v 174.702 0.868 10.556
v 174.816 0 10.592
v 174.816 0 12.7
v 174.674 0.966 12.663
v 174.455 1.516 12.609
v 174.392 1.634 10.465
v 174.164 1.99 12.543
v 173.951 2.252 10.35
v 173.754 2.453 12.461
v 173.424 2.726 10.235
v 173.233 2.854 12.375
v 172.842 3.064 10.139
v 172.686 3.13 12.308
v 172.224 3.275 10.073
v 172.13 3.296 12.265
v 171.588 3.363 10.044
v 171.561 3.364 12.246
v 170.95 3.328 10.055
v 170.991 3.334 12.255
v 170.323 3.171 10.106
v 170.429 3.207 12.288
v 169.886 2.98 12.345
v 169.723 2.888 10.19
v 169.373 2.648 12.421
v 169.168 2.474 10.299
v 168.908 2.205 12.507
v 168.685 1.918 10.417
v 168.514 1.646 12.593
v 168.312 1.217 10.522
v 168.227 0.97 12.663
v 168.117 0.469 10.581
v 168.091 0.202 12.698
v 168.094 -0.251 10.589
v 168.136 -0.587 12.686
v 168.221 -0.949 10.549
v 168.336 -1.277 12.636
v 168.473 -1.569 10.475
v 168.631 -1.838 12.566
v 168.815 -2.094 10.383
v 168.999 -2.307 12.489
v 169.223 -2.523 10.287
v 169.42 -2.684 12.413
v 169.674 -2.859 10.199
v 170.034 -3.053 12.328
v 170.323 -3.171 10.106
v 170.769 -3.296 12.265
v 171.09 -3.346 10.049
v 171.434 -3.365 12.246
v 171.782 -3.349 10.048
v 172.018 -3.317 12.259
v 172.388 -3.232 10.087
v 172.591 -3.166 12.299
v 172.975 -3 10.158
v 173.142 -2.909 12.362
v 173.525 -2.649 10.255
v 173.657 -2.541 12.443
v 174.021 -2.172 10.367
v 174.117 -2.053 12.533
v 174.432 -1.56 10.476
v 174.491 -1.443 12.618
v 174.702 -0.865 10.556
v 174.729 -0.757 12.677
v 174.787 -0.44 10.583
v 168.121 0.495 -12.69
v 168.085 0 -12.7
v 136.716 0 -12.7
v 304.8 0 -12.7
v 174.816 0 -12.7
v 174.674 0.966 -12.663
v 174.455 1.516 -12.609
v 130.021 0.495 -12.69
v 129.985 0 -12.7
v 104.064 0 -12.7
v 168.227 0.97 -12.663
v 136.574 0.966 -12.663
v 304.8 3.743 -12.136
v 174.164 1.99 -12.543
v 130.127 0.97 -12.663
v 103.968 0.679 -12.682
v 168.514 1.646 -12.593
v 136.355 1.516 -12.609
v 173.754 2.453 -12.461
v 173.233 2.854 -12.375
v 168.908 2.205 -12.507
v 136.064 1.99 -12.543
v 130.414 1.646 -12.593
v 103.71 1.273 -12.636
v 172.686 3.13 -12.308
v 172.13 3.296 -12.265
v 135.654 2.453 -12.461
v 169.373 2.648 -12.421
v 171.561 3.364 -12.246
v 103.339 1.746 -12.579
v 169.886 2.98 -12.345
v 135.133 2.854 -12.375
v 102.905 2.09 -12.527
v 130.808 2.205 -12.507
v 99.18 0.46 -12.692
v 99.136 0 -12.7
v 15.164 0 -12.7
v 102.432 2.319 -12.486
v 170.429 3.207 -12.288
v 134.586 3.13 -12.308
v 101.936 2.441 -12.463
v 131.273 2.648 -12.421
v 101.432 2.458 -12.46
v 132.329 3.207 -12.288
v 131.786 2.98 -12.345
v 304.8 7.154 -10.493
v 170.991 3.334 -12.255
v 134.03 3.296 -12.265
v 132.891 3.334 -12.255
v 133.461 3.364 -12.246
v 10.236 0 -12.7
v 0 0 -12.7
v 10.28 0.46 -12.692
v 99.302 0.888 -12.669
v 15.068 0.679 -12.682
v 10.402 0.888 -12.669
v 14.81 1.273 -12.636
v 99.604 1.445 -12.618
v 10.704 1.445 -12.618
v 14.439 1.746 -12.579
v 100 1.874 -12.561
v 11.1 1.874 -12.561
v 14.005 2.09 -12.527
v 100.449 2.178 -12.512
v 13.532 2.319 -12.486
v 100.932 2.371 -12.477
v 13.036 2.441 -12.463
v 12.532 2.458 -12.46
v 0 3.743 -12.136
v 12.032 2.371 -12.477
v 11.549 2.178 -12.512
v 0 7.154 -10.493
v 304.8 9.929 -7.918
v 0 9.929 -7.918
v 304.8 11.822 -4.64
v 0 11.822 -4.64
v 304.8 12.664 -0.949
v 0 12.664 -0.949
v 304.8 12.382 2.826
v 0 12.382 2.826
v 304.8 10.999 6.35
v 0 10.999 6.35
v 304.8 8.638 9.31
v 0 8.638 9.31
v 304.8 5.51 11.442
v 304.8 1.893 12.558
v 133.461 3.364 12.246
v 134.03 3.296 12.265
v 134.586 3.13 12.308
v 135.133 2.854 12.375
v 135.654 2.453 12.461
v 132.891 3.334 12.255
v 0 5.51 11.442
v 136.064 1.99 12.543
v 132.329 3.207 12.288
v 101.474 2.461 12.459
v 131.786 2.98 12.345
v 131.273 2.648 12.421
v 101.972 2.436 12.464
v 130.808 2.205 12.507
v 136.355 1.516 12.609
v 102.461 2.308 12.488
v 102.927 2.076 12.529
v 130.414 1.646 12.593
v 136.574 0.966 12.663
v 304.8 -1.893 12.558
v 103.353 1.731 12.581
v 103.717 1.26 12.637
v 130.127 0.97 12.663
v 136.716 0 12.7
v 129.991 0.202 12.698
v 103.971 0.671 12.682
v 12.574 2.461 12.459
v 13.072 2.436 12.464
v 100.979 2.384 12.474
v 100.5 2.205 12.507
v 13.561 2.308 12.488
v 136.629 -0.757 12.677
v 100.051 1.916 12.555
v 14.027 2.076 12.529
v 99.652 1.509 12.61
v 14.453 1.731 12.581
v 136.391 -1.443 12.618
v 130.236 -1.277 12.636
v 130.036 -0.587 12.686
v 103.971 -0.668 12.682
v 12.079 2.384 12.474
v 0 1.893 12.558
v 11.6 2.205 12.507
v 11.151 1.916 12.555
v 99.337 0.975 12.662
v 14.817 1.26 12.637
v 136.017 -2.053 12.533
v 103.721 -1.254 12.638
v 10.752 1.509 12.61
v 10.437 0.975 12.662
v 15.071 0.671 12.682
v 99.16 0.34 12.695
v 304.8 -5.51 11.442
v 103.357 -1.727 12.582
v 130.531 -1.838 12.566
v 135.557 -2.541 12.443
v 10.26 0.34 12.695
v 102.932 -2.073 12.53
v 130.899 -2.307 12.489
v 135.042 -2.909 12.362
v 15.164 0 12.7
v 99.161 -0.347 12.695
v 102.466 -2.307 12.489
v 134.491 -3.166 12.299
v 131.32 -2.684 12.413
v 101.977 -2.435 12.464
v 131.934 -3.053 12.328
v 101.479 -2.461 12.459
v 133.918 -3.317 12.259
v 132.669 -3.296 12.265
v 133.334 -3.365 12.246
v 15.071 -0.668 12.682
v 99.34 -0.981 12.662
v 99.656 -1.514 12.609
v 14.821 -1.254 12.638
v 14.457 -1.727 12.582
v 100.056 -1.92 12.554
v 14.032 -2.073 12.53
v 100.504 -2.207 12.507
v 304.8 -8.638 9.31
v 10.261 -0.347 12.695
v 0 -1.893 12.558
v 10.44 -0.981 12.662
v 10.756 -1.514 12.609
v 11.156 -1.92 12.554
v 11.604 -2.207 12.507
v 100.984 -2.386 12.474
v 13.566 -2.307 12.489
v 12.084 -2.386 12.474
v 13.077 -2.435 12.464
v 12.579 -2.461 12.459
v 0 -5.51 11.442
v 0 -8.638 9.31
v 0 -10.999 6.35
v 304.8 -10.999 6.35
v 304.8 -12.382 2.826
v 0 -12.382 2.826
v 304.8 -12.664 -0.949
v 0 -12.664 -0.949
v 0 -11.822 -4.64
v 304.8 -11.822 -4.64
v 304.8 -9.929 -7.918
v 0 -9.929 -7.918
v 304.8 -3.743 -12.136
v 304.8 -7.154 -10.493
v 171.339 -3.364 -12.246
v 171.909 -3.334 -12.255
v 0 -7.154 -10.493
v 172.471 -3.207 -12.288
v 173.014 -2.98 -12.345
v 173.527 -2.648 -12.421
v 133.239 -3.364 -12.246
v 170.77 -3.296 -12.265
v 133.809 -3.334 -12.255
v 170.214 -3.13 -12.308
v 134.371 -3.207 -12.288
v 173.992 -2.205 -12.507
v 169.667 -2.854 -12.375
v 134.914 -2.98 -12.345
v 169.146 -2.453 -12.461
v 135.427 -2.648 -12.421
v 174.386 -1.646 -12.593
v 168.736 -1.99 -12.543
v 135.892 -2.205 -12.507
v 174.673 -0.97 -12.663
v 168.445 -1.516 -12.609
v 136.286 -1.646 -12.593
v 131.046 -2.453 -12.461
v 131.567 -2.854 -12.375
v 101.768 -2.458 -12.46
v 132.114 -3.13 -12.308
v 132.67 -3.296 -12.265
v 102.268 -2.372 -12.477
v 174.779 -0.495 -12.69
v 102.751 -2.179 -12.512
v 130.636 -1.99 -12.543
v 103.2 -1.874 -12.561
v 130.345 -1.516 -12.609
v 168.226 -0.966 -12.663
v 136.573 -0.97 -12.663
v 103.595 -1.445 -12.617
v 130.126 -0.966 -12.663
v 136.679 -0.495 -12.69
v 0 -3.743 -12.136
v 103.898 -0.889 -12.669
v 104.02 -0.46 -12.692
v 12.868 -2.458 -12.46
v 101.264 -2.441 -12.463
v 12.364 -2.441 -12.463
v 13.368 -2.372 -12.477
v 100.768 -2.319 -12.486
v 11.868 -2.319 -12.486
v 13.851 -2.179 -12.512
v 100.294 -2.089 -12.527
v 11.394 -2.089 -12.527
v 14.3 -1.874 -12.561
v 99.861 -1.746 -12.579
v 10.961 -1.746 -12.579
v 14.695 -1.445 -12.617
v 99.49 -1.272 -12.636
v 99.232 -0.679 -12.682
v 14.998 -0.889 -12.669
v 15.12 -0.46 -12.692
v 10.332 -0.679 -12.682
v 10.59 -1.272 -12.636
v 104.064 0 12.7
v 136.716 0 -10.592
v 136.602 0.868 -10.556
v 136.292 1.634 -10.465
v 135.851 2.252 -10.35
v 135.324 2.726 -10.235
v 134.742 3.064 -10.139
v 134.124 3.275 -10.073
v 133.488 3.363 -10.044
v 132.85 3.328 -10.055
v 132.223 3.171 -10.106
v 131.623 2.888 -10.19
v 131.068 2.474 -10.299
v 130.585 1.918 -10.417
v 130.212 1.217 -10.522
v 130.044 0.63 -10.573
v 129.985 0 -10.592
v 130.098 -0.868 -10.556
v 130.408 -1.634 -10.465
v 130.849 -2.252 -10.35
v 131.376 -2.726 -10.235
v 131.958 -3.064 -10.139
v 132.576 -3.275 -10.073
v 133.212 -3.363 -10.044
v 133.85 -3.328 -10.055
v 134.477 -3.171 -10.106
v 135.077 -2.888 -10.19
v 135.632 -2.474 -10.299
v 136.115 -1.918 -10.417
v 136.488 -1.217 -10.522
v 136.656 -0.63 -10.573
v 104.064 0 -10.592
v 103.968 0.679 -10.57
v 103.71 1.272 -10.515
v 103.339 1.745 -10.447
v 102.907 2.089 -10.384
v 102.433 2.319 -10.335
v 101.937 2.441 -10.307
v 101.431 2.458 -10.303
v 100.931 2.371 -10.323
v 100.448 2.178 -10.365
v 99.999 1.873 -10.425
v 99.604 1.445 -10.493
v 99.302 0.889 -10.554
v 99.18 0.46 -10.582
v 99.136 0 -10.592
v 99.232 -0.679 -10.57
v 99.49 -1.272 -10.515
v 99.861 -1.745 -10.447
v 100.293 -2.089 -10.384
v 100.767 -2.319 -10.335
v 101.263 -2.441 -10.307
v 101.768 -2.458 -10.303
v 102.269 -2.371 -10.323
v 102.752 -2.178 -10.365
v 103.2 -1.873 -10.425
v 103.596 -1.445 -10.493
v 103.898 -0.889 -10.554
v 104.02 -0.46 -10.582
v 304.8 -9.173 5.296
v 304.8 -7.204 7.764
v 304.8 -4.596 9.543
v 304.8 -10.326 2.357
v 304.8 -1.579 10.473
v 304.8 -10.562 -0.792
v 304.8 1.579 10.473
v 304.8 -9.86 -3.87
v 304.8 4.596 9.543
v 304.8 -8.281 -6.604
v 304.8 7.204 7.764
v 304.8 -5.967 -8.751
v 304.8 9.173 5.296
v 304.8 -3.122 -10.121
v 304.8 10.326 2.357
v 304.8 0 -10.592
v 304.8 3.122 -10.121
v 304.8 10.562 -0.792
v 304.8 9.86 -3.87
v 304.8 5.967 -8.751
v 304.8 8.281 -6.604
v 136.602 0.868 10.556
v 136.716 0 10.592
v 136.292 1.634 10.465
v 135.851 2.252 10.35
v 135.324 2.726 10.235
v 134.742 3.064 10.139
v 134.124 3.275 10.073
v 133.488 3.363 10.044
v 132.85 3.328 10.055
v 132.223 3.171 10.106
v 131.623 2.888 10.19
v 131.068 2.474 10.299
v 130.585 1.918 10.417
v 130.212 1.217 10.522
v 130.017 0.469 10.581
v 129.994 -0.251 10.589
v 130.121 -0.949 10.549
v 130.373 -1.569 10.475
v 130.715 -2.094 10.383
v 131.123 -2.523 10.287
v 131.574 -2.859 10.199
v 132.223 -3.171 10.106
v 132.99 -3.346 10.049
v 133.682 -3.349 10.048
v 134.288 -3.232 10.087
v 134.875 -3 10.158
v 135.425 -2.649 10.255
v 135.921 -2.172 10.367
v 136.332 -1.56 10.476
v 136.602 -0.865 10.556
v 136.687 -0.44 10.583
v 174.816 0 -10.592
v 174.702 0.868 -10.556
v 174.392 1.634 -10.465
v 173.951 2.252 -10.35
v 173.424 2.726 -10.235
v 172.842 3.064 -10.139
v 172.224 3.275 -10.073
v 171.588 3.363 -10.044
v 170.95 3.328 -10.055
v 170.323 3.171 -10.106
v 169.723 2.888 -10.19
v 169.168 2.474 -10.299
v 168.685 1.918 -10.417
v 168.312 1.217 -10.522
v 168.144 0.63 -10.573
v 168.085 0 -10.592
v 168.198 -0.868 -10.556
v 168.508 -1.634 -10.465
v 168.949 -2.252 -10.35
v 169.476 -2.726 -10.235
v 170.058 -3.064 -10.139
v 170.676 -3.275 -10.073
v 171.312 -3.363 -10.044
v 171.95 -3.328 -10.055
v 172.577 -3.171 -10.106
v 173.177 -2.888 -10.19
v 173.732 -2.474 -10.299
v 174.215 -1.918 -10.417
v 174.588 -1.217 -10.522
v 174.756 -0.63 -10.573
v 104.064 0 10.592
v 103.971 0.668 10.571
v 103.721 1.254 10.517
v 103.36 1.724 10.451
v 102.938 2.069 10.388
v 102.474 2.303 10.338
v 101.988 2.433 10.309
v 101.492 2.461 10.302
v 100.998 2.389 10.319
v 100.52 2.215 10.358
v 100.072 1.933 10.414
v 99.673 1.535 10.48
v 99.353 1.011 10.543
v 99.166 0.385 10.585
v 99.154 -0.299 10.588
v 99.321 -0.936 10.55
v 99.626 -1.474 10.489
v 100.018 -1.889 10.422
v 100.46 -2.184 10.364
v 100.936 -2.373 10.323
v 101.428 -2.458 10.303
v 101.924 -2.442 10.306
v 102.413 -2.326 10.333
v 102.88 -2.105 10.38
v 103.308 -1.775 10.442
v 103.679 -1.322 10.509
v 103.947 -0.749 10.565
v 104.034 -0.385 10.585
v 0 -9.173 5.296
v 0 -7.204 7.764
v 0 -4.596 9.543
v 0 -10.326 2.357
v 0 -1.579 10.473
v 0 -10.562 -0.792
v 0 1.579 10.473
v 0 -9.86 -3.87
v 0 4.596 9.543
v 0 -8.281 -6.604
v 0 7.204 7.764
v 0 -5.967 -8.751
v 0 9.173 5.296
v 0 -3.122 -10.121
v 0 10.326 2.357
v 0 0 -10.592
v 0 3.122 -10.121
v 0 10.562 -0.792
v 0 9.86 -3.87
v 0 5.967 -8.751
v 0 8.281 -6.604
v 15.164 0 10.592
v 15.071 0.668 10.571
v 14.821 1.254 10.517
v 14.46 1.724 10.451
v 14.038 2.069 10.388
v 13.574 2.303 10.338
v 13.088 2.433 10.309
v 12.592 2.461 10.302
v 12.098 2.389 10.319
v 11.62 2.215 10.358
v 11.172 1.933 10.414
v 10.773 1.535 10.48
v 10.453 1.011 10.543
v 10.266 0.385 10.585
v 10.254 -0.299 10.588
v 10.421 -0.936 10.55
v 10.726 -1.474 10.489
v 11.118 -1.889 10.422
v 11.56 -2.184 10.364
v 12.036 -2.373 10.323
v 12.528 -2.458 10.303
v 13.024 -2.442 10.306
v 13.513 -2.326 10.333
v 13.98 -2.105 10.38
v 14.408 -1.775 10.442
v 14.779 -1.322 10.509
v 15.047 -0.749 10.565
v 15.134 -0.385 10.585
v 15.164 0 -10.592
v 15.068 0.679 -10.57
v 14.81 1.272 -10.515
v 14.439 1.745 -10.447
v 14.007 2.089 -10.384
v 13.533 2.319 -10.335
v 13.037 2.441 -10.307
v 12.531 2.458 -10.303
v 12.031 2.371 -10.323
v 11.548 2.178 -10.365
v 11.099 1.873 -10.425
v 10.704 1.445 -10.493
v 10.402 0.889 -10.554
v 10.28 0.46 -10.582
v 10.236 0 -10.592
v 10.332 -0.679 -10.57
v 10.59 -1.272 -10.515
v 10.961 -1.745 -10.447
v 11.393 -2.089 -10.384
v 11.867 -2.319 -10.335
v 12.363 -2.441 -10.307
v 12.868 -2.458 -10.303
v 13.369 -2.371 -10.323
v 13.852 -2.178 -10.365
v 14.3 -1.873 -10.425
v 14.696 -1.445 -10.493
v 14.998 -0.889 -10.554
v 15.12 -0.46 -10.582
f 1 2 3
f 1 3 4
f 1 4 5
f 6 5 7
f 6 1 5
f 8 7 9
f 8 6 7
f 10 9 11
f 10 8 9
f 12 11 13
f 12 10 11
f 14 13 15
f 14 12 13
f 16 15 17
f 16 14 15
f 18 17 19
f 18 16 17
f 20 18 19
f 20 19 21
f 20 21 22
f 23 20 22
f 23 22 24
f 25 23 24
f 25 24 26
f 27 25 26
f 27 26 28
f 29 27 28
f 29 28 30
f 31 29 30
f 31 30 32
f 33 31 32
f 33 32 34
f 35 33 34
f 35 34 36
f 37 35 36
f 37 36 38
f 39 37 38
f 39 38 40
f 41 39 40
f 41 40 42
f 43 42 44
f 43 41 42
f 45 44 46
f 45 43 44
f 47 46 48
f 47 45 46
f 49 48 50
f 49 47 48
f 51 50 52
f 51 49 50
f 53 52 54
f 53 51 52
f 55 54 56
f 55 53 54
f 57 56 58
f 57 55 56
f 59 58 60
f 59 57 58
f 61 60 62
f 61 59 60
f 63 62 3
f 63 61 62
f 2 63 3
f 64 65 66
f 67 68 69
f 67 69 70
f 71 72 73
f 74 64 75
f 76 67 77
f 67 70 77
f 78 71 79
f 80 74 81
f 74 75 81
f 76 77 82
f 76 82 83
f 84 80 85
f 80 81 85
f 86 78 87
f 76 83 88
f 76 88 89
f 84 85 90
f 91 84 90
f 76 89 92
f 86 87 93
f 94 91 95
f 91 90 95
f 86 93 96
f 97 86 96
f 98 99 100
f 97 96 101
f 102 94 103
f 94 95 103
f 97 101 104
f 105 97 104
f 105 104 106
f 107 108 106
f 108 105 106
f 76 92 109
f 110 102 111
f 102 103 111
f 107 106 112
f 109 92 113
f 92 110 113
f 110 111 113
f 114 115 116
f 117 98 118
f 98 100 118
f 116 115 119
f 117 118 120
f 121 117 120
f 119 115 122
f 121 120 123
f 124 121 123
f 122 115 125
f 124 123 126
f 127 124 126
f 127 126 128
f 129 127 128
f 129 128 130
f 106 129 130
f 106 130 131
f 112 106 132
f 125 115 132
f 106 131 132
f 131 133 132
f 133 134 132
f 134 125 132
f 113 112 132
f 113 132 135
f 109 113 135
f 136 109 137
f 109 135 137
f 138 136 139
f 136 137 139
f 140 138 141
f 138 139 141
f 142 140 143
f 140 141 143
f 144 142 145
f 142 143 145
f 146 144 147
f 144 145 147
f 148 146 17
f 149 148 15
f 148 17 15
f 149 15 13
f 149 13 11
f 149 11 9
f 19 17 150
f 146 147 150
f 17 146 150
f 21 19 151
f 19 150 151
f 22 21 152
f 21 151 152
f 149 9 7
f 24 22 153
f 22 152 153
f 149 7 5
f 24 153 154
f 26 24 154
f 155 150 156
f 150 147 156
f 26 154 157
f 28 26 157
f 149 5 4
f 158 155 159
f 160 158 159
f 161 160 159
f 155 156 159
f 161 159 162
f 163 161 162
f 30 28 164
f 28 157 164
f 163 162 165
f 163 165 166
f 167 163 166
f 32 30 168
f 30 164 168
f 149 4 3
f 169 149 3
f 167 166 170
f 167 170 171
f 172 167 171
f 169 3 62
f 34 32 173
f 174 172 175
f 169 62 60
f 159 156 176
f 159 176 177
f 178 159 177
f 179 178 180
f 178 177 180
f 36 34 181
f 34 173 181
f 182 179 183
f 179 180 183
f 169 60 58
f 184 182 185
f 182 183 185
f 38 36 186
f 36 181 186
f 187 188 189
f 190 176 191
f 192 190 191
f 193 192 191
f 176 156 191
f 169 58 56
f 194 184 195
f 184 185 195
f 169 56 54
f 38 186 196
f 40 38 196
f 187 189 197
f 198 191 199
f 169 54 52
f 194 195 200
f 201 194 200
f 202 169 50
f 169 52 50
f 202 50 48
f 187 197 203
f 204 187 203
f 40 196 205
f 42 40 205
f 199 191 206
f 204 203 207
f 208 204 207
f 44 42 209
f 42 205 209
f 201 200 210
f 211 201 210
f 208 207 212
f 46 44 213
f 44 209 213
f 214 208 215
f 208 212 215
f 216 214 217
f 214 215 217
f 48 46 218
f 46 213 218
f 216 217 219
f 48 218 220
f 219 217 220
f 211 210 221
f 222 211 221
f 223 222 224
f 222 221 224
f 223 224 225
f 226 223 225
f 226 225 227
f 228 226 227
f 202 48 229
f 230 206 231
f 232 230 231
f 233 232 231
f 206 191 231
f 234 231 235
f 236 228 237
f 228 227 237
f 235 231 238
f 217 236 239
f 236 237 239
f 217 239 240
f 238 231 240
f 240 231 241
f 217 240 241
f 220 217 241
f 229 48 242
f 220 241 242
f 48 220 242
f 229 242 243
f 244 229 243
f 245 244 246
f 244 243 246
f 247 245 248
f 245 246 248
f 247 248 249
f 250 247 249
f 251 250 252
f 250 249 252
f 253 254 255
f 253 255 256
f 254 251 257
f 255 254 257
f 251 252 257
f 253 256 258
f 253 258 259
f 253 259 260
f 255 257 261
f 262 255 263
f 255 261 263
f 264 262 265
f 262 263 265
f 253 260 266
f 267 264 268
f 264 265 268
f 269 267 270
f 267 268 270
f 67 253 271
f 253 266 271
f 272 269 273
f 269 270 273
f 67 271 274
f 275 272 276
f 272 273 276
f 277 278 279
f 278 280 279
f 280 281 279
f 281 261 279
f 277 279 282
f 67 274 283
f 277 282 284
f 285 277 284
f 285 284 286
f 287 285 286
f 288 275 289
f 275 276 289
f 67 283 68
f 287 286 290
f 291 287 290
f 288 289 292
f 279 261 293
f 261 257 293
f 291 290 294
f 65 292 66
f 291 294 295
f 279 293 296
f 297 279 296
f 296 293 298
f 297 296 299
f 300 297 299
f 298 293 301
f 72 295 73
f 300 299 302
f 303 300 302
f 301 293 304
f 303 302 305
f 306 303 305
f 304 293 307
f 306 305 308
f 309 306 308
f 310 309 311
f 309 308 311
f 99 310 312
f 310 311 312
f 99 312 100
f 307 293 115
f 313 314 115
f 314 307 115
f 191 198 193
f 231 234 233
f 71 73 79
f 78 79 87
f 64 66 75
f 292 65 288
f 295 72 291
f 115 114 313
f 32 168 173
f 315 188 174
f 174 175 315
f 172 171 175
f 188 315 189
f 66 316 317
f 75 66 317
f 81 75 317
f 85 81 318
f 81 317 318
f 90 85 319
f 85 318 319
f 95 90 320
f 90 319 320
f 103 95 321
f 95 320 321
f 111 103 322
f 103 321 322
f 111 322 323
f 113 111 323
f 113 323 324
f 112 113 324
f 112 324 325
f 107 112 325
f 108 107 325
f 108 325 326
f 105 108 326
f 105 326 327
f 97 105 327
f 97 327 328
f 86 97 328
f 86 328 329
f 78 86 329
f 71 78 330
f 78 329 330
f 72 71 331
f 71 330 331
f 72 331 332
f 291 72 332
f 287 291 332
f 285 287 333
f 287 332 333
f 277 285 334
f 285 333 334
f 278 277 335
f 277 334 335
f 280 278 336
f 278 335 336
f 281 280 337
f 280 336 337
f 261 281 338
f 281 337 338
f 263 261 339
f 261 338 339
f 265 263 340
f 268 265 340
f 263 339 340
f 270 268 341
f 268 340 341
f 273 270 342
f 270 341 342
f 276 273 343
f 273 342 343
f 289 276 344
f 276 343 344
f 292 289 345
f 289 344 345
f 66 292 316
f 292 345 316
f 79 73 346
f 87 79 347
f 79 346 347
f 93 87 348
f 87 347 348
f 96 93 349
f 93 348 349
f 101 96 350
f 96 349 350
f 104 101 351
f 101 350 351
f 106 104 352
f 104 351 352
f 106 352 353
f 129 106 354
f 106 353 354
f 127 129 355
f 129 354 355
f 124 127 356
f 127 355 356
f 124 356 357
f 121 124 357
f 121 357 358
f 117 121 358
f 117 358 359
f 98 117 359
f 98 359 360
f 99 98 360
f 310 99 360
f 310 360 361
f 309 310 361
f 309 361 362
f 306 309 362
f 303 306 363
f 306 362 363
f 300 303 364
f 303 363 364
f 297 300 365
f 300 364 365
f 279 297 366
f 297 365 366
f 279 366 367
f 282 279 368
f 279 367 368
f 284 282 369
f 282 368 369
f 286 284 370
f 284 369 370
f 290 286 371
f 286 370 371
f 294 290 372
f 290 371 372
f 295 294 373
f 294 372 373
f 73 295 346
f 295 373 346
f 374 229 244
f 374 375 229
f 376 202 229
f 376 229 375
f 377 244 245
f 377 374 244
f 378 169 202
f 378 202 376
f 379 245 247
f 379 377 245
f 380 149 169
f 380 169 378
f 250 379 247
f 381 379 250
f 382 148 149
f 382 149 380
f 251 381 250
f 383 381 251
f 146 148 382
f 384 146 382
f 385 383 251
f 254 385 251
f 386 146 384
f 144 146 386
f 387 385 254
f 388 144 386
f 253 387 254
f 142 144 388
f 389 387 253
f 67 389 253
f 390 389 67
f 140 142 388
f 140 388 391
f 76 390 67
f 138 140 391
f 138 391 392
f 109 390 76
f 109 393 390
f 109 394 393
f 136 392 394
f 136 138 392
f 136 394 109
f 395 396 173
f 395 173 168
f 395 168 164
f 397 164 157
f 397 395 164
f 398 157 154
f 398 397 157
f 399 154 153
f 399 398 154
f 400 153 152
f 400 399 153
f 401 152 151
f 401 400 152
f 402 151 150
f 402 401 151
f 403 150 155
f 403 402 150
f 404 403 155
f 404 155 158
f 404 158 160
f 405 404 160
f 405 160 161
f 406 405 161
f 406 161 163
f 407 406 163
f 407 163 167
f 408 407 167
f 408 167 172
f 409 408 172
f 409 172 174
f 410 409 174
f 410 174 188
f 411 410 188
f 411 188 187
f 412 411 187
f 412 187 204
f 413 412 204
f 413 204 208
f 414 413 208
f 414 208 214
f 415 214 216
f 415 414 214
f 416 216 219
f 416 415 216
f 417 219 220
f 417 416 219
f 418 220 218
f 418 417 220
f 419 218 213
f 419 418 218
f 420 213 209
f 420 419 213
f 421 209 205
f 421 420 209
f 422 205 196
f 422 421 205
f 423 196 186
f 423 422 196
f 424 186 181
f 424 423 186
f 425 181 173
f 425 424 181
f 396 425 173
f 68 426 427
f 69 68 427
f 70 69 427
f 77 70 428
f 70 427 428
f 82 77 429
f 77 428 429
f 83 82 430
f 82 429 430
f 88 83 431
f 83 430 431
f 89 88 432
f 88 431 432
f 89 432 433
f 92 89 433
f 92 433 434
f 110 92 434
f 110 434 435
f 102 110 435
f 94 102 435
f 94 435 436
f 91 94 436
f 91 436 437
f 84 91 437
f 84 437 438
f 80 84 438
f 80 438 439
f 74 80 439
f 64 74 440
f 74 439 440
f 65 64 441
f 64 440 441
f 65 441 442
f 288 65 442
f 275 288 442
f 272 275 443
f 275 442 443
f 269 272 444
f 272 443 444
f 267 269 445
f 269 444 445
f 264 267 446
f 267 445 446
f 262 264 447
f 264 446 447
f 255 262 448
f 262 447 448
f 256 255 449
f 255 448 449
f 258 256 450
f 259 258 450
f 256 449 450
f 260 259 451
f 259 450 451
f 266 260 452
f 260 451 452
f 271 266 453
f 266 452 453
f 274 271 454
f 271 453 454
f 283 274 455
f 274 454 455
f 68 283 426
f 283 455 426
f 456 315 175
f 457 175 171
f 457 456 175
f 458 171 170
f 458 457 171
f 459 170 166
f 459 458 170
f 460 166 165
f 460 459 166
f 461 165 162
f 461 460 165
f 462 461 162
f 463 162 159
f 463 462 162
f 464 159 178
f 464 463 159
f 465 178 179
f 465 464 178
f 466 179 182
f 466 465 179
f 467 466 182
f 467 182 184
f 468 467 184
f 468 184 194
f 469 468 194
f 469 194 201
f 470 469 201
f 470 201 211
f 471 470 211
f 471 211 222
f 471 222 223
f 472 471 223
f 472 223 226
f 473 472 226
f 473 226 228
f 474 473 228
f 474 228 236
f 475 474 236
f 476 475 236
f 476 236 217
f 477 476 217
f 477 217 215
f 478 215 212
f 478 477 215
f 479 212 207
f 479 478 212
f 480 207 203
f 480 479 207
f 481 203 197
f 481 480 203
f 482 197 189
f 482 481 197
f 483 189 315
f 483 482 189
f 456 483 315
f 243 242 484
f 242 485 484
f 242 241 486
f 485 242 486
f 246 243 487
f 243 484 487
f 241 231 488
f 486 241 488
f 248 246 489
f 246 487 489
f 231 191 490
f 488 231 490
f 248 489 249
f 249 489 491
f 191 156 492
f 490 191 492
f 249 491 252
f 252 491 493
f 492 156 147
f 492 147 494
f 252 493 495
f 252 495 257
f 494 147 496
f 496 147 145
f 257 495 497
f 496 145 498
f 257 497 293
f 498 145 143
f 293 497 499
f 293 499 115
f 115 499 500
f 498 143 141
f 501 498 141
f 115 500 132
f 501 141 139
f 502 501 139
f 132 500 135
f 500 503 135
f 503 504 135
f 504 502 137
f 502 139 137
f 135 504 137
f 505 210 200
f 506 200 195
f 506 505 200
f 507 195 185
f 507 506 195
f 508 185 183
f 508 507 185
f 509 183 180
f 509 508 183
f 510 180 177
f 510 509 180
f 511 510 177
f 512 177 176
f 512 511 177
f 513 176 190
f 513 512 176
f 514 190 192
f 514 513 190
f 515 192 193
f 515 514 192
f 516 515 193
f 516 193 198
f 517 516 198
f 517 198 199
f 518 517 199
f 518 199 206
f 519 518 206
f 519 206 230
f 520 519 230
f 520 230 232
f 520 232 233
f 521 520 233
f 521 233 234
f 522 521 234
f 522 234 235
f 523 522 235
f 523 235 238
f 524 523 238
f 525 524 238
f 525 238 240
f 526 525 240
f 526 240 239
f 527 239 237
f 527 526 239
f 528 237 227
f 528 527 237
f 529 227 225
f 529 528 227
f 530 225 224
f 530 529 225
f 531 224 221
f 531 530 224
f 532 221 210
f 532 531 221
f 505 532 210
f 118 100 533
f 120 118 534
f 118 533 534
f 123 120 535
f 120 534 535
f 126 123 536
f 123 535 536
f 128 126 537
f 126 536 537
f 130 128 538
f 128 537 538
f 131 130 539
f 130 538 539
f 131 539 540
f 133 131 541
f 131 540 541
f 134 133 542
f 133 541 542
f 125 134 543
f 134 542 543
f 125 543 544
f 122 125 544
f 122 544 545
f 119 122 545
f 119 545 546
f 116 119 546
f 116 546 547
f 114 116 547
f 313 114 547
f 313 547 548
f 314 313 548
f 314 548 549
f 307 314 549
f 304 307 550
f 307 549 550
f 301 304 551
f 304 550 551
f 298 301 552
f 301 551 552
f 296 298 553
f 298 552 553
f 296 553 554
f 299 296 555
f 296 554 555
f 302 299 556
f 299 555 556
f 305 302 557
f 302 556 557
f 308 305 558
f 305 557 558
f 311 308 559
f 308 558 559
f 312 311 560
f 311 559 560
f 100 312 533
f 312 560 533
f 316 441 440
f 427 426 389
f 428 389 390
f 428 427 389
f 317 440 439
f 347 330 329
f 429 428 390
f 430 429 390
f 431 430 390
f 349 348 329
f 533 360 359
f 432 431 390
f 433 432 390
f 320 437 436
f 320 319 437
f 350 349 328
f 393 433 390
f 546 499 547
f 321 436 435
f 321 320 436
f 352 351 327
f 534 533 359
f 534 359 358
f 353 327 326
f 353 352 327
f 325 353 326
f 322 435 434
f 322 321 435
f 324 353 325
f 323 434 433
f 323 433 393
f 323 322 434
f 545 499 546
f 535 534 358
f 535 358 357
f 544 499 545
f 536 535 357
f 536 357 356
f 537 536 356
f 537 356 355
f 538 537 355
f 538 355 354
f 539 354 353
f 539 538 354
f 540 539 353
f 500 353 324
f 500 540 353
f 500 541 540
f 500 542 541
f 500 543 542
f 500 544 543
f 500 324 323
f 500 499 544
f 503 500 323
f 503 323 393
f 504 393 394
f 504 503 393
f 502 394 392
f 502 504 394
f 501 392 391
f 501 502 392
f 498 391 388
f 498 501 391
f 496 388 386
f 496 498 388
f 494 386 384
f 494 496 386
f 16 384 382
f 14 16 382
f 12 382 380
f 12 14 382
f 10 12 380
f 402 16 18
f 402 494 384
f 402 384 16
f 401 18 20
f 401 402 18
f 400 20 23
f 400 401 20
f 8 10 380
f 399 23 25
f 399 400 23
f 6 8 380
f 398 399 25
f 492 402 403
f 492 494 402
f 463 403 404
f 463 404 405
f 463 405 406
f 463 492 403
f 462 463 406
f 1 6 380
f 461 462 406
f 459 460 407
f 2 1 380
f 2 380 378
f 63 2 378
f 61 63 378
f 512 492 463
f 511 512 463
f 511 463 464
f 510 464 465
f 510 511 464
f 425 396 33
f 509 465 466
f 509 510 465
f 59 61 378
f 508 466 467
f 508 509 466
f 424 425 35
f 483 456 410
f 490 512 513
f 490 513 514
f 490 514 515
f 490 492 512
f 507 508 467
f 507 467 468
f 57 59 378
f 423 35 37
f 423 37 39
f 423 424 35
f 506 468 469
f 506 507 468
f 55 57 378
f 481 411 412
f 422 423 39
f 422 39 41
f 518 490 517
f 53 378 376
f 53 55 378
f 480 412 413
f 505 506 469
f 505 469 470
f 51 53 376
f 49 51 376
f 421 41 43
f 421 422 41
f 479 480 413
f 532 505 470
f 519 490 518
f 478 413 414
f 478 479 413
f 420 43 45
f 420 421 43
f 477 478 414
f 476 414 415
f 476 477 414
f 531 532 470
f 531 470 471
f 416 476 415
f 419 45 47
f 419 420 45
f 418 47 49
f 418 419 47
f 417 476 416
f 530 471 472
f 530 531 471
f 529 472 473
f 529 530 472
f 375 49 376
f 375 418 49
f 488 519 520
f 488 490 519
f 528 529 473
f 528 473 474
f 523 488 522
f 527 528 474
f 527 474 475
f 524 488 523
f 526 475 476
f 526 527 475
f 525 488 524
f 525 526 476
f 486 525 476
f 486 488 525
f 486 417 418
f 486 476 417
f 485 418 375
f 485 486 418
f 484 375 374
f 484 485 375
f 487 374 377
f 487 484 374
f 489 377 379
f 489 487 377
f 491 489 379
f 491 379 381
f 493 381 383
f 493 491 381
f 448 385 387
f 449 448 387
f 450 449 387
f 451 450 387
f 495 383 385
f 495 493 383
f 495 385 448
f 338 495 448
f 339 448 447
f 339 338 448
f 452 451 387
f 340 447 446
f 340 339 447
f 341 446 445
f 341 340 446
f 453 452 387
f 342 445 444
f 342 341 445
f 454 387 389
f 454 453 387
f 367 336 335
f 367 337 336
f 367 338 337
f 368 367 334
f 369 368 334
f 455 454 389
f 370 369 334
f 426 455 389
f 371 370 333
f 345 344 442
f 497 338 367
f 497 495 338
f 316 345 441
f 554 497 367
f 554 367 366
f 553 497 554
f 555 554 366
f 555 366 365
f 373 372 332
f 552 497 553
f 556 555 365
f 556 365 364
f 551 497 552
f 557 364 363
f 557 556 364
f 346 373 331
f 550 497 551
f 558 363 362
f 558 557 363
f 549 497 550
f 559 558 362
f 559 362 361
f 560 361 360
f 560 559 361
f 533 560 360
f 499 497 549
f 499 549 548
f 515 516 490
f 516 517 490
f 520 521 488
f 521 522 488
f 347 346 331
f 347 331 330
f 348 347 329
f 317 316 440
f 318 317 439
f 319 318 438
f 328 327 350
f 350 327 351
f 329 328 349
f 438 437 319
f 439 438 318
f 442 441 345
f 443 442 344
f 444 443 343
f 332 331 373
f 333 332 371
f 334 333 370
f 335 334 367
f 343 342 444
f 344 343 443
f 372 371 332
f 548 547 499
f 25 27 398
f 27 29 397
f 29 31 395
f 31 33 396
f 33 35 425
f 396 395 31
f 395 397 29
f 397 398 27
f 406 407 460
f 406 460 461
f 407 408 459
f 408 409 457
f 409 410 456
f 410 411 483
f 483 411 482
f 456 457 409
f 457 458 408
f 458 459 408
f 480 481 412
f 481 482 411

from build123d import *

# Parameters (mm, degrees)
SKETCH1_R               = 12.7
SKETCH1_R_2             = 10.5918
BOSS_EXTRUDE1_DEPTH     = 304.8
SKETCH8_R               = 2.4638
SKETCH8_R_2             = 3.3655
CUT_EXTRUDE1_DEPTH      = 13.7
CUT_EXTRUDE1_DEPTH_BACK = 13.7


with BuildPart() as part:
    # Sketch1 → Boss-Extrude1 (new body)
    with BuildSketch(Plane(origin=(0, 0, 0), x_dir=(0, 0, -1), z_dir=(1, 0, 0))):
        Circle(SKETCH1_R)
        Circle(SKETCH1_R_2, mode=Mode.SUBTRACT)
    extrude(amount=BOSS_EXTRUDE1_DEPTH)

    # Sketch8 → Cut-Extrude1 (cut, two sides)
    with BuildSketch(Plane.XY) as cut_extrude1_sk:
        with Locations((12.7, 0)):
            Circle(SKETCH8_R)
        with Locations((101.6, 0)):
            Circle(SKETCH8_R)
        with Locations((133.35, 0)):
            Circle(SKETCH8_R_2)
        with Locations((171.45, 0)):
            Circle(SKETCH8_R_2)
    extrude(amount=CUT_EXTRUDE1_DEPTH, mode=Mode.SUBTRACT)
    extrude(cut_extrude1_sk.sketch, amount=-CUT_EXTRUDE1_DEPTH_BACK, mode=Mode.SUBTRACT)


solid = part.part
